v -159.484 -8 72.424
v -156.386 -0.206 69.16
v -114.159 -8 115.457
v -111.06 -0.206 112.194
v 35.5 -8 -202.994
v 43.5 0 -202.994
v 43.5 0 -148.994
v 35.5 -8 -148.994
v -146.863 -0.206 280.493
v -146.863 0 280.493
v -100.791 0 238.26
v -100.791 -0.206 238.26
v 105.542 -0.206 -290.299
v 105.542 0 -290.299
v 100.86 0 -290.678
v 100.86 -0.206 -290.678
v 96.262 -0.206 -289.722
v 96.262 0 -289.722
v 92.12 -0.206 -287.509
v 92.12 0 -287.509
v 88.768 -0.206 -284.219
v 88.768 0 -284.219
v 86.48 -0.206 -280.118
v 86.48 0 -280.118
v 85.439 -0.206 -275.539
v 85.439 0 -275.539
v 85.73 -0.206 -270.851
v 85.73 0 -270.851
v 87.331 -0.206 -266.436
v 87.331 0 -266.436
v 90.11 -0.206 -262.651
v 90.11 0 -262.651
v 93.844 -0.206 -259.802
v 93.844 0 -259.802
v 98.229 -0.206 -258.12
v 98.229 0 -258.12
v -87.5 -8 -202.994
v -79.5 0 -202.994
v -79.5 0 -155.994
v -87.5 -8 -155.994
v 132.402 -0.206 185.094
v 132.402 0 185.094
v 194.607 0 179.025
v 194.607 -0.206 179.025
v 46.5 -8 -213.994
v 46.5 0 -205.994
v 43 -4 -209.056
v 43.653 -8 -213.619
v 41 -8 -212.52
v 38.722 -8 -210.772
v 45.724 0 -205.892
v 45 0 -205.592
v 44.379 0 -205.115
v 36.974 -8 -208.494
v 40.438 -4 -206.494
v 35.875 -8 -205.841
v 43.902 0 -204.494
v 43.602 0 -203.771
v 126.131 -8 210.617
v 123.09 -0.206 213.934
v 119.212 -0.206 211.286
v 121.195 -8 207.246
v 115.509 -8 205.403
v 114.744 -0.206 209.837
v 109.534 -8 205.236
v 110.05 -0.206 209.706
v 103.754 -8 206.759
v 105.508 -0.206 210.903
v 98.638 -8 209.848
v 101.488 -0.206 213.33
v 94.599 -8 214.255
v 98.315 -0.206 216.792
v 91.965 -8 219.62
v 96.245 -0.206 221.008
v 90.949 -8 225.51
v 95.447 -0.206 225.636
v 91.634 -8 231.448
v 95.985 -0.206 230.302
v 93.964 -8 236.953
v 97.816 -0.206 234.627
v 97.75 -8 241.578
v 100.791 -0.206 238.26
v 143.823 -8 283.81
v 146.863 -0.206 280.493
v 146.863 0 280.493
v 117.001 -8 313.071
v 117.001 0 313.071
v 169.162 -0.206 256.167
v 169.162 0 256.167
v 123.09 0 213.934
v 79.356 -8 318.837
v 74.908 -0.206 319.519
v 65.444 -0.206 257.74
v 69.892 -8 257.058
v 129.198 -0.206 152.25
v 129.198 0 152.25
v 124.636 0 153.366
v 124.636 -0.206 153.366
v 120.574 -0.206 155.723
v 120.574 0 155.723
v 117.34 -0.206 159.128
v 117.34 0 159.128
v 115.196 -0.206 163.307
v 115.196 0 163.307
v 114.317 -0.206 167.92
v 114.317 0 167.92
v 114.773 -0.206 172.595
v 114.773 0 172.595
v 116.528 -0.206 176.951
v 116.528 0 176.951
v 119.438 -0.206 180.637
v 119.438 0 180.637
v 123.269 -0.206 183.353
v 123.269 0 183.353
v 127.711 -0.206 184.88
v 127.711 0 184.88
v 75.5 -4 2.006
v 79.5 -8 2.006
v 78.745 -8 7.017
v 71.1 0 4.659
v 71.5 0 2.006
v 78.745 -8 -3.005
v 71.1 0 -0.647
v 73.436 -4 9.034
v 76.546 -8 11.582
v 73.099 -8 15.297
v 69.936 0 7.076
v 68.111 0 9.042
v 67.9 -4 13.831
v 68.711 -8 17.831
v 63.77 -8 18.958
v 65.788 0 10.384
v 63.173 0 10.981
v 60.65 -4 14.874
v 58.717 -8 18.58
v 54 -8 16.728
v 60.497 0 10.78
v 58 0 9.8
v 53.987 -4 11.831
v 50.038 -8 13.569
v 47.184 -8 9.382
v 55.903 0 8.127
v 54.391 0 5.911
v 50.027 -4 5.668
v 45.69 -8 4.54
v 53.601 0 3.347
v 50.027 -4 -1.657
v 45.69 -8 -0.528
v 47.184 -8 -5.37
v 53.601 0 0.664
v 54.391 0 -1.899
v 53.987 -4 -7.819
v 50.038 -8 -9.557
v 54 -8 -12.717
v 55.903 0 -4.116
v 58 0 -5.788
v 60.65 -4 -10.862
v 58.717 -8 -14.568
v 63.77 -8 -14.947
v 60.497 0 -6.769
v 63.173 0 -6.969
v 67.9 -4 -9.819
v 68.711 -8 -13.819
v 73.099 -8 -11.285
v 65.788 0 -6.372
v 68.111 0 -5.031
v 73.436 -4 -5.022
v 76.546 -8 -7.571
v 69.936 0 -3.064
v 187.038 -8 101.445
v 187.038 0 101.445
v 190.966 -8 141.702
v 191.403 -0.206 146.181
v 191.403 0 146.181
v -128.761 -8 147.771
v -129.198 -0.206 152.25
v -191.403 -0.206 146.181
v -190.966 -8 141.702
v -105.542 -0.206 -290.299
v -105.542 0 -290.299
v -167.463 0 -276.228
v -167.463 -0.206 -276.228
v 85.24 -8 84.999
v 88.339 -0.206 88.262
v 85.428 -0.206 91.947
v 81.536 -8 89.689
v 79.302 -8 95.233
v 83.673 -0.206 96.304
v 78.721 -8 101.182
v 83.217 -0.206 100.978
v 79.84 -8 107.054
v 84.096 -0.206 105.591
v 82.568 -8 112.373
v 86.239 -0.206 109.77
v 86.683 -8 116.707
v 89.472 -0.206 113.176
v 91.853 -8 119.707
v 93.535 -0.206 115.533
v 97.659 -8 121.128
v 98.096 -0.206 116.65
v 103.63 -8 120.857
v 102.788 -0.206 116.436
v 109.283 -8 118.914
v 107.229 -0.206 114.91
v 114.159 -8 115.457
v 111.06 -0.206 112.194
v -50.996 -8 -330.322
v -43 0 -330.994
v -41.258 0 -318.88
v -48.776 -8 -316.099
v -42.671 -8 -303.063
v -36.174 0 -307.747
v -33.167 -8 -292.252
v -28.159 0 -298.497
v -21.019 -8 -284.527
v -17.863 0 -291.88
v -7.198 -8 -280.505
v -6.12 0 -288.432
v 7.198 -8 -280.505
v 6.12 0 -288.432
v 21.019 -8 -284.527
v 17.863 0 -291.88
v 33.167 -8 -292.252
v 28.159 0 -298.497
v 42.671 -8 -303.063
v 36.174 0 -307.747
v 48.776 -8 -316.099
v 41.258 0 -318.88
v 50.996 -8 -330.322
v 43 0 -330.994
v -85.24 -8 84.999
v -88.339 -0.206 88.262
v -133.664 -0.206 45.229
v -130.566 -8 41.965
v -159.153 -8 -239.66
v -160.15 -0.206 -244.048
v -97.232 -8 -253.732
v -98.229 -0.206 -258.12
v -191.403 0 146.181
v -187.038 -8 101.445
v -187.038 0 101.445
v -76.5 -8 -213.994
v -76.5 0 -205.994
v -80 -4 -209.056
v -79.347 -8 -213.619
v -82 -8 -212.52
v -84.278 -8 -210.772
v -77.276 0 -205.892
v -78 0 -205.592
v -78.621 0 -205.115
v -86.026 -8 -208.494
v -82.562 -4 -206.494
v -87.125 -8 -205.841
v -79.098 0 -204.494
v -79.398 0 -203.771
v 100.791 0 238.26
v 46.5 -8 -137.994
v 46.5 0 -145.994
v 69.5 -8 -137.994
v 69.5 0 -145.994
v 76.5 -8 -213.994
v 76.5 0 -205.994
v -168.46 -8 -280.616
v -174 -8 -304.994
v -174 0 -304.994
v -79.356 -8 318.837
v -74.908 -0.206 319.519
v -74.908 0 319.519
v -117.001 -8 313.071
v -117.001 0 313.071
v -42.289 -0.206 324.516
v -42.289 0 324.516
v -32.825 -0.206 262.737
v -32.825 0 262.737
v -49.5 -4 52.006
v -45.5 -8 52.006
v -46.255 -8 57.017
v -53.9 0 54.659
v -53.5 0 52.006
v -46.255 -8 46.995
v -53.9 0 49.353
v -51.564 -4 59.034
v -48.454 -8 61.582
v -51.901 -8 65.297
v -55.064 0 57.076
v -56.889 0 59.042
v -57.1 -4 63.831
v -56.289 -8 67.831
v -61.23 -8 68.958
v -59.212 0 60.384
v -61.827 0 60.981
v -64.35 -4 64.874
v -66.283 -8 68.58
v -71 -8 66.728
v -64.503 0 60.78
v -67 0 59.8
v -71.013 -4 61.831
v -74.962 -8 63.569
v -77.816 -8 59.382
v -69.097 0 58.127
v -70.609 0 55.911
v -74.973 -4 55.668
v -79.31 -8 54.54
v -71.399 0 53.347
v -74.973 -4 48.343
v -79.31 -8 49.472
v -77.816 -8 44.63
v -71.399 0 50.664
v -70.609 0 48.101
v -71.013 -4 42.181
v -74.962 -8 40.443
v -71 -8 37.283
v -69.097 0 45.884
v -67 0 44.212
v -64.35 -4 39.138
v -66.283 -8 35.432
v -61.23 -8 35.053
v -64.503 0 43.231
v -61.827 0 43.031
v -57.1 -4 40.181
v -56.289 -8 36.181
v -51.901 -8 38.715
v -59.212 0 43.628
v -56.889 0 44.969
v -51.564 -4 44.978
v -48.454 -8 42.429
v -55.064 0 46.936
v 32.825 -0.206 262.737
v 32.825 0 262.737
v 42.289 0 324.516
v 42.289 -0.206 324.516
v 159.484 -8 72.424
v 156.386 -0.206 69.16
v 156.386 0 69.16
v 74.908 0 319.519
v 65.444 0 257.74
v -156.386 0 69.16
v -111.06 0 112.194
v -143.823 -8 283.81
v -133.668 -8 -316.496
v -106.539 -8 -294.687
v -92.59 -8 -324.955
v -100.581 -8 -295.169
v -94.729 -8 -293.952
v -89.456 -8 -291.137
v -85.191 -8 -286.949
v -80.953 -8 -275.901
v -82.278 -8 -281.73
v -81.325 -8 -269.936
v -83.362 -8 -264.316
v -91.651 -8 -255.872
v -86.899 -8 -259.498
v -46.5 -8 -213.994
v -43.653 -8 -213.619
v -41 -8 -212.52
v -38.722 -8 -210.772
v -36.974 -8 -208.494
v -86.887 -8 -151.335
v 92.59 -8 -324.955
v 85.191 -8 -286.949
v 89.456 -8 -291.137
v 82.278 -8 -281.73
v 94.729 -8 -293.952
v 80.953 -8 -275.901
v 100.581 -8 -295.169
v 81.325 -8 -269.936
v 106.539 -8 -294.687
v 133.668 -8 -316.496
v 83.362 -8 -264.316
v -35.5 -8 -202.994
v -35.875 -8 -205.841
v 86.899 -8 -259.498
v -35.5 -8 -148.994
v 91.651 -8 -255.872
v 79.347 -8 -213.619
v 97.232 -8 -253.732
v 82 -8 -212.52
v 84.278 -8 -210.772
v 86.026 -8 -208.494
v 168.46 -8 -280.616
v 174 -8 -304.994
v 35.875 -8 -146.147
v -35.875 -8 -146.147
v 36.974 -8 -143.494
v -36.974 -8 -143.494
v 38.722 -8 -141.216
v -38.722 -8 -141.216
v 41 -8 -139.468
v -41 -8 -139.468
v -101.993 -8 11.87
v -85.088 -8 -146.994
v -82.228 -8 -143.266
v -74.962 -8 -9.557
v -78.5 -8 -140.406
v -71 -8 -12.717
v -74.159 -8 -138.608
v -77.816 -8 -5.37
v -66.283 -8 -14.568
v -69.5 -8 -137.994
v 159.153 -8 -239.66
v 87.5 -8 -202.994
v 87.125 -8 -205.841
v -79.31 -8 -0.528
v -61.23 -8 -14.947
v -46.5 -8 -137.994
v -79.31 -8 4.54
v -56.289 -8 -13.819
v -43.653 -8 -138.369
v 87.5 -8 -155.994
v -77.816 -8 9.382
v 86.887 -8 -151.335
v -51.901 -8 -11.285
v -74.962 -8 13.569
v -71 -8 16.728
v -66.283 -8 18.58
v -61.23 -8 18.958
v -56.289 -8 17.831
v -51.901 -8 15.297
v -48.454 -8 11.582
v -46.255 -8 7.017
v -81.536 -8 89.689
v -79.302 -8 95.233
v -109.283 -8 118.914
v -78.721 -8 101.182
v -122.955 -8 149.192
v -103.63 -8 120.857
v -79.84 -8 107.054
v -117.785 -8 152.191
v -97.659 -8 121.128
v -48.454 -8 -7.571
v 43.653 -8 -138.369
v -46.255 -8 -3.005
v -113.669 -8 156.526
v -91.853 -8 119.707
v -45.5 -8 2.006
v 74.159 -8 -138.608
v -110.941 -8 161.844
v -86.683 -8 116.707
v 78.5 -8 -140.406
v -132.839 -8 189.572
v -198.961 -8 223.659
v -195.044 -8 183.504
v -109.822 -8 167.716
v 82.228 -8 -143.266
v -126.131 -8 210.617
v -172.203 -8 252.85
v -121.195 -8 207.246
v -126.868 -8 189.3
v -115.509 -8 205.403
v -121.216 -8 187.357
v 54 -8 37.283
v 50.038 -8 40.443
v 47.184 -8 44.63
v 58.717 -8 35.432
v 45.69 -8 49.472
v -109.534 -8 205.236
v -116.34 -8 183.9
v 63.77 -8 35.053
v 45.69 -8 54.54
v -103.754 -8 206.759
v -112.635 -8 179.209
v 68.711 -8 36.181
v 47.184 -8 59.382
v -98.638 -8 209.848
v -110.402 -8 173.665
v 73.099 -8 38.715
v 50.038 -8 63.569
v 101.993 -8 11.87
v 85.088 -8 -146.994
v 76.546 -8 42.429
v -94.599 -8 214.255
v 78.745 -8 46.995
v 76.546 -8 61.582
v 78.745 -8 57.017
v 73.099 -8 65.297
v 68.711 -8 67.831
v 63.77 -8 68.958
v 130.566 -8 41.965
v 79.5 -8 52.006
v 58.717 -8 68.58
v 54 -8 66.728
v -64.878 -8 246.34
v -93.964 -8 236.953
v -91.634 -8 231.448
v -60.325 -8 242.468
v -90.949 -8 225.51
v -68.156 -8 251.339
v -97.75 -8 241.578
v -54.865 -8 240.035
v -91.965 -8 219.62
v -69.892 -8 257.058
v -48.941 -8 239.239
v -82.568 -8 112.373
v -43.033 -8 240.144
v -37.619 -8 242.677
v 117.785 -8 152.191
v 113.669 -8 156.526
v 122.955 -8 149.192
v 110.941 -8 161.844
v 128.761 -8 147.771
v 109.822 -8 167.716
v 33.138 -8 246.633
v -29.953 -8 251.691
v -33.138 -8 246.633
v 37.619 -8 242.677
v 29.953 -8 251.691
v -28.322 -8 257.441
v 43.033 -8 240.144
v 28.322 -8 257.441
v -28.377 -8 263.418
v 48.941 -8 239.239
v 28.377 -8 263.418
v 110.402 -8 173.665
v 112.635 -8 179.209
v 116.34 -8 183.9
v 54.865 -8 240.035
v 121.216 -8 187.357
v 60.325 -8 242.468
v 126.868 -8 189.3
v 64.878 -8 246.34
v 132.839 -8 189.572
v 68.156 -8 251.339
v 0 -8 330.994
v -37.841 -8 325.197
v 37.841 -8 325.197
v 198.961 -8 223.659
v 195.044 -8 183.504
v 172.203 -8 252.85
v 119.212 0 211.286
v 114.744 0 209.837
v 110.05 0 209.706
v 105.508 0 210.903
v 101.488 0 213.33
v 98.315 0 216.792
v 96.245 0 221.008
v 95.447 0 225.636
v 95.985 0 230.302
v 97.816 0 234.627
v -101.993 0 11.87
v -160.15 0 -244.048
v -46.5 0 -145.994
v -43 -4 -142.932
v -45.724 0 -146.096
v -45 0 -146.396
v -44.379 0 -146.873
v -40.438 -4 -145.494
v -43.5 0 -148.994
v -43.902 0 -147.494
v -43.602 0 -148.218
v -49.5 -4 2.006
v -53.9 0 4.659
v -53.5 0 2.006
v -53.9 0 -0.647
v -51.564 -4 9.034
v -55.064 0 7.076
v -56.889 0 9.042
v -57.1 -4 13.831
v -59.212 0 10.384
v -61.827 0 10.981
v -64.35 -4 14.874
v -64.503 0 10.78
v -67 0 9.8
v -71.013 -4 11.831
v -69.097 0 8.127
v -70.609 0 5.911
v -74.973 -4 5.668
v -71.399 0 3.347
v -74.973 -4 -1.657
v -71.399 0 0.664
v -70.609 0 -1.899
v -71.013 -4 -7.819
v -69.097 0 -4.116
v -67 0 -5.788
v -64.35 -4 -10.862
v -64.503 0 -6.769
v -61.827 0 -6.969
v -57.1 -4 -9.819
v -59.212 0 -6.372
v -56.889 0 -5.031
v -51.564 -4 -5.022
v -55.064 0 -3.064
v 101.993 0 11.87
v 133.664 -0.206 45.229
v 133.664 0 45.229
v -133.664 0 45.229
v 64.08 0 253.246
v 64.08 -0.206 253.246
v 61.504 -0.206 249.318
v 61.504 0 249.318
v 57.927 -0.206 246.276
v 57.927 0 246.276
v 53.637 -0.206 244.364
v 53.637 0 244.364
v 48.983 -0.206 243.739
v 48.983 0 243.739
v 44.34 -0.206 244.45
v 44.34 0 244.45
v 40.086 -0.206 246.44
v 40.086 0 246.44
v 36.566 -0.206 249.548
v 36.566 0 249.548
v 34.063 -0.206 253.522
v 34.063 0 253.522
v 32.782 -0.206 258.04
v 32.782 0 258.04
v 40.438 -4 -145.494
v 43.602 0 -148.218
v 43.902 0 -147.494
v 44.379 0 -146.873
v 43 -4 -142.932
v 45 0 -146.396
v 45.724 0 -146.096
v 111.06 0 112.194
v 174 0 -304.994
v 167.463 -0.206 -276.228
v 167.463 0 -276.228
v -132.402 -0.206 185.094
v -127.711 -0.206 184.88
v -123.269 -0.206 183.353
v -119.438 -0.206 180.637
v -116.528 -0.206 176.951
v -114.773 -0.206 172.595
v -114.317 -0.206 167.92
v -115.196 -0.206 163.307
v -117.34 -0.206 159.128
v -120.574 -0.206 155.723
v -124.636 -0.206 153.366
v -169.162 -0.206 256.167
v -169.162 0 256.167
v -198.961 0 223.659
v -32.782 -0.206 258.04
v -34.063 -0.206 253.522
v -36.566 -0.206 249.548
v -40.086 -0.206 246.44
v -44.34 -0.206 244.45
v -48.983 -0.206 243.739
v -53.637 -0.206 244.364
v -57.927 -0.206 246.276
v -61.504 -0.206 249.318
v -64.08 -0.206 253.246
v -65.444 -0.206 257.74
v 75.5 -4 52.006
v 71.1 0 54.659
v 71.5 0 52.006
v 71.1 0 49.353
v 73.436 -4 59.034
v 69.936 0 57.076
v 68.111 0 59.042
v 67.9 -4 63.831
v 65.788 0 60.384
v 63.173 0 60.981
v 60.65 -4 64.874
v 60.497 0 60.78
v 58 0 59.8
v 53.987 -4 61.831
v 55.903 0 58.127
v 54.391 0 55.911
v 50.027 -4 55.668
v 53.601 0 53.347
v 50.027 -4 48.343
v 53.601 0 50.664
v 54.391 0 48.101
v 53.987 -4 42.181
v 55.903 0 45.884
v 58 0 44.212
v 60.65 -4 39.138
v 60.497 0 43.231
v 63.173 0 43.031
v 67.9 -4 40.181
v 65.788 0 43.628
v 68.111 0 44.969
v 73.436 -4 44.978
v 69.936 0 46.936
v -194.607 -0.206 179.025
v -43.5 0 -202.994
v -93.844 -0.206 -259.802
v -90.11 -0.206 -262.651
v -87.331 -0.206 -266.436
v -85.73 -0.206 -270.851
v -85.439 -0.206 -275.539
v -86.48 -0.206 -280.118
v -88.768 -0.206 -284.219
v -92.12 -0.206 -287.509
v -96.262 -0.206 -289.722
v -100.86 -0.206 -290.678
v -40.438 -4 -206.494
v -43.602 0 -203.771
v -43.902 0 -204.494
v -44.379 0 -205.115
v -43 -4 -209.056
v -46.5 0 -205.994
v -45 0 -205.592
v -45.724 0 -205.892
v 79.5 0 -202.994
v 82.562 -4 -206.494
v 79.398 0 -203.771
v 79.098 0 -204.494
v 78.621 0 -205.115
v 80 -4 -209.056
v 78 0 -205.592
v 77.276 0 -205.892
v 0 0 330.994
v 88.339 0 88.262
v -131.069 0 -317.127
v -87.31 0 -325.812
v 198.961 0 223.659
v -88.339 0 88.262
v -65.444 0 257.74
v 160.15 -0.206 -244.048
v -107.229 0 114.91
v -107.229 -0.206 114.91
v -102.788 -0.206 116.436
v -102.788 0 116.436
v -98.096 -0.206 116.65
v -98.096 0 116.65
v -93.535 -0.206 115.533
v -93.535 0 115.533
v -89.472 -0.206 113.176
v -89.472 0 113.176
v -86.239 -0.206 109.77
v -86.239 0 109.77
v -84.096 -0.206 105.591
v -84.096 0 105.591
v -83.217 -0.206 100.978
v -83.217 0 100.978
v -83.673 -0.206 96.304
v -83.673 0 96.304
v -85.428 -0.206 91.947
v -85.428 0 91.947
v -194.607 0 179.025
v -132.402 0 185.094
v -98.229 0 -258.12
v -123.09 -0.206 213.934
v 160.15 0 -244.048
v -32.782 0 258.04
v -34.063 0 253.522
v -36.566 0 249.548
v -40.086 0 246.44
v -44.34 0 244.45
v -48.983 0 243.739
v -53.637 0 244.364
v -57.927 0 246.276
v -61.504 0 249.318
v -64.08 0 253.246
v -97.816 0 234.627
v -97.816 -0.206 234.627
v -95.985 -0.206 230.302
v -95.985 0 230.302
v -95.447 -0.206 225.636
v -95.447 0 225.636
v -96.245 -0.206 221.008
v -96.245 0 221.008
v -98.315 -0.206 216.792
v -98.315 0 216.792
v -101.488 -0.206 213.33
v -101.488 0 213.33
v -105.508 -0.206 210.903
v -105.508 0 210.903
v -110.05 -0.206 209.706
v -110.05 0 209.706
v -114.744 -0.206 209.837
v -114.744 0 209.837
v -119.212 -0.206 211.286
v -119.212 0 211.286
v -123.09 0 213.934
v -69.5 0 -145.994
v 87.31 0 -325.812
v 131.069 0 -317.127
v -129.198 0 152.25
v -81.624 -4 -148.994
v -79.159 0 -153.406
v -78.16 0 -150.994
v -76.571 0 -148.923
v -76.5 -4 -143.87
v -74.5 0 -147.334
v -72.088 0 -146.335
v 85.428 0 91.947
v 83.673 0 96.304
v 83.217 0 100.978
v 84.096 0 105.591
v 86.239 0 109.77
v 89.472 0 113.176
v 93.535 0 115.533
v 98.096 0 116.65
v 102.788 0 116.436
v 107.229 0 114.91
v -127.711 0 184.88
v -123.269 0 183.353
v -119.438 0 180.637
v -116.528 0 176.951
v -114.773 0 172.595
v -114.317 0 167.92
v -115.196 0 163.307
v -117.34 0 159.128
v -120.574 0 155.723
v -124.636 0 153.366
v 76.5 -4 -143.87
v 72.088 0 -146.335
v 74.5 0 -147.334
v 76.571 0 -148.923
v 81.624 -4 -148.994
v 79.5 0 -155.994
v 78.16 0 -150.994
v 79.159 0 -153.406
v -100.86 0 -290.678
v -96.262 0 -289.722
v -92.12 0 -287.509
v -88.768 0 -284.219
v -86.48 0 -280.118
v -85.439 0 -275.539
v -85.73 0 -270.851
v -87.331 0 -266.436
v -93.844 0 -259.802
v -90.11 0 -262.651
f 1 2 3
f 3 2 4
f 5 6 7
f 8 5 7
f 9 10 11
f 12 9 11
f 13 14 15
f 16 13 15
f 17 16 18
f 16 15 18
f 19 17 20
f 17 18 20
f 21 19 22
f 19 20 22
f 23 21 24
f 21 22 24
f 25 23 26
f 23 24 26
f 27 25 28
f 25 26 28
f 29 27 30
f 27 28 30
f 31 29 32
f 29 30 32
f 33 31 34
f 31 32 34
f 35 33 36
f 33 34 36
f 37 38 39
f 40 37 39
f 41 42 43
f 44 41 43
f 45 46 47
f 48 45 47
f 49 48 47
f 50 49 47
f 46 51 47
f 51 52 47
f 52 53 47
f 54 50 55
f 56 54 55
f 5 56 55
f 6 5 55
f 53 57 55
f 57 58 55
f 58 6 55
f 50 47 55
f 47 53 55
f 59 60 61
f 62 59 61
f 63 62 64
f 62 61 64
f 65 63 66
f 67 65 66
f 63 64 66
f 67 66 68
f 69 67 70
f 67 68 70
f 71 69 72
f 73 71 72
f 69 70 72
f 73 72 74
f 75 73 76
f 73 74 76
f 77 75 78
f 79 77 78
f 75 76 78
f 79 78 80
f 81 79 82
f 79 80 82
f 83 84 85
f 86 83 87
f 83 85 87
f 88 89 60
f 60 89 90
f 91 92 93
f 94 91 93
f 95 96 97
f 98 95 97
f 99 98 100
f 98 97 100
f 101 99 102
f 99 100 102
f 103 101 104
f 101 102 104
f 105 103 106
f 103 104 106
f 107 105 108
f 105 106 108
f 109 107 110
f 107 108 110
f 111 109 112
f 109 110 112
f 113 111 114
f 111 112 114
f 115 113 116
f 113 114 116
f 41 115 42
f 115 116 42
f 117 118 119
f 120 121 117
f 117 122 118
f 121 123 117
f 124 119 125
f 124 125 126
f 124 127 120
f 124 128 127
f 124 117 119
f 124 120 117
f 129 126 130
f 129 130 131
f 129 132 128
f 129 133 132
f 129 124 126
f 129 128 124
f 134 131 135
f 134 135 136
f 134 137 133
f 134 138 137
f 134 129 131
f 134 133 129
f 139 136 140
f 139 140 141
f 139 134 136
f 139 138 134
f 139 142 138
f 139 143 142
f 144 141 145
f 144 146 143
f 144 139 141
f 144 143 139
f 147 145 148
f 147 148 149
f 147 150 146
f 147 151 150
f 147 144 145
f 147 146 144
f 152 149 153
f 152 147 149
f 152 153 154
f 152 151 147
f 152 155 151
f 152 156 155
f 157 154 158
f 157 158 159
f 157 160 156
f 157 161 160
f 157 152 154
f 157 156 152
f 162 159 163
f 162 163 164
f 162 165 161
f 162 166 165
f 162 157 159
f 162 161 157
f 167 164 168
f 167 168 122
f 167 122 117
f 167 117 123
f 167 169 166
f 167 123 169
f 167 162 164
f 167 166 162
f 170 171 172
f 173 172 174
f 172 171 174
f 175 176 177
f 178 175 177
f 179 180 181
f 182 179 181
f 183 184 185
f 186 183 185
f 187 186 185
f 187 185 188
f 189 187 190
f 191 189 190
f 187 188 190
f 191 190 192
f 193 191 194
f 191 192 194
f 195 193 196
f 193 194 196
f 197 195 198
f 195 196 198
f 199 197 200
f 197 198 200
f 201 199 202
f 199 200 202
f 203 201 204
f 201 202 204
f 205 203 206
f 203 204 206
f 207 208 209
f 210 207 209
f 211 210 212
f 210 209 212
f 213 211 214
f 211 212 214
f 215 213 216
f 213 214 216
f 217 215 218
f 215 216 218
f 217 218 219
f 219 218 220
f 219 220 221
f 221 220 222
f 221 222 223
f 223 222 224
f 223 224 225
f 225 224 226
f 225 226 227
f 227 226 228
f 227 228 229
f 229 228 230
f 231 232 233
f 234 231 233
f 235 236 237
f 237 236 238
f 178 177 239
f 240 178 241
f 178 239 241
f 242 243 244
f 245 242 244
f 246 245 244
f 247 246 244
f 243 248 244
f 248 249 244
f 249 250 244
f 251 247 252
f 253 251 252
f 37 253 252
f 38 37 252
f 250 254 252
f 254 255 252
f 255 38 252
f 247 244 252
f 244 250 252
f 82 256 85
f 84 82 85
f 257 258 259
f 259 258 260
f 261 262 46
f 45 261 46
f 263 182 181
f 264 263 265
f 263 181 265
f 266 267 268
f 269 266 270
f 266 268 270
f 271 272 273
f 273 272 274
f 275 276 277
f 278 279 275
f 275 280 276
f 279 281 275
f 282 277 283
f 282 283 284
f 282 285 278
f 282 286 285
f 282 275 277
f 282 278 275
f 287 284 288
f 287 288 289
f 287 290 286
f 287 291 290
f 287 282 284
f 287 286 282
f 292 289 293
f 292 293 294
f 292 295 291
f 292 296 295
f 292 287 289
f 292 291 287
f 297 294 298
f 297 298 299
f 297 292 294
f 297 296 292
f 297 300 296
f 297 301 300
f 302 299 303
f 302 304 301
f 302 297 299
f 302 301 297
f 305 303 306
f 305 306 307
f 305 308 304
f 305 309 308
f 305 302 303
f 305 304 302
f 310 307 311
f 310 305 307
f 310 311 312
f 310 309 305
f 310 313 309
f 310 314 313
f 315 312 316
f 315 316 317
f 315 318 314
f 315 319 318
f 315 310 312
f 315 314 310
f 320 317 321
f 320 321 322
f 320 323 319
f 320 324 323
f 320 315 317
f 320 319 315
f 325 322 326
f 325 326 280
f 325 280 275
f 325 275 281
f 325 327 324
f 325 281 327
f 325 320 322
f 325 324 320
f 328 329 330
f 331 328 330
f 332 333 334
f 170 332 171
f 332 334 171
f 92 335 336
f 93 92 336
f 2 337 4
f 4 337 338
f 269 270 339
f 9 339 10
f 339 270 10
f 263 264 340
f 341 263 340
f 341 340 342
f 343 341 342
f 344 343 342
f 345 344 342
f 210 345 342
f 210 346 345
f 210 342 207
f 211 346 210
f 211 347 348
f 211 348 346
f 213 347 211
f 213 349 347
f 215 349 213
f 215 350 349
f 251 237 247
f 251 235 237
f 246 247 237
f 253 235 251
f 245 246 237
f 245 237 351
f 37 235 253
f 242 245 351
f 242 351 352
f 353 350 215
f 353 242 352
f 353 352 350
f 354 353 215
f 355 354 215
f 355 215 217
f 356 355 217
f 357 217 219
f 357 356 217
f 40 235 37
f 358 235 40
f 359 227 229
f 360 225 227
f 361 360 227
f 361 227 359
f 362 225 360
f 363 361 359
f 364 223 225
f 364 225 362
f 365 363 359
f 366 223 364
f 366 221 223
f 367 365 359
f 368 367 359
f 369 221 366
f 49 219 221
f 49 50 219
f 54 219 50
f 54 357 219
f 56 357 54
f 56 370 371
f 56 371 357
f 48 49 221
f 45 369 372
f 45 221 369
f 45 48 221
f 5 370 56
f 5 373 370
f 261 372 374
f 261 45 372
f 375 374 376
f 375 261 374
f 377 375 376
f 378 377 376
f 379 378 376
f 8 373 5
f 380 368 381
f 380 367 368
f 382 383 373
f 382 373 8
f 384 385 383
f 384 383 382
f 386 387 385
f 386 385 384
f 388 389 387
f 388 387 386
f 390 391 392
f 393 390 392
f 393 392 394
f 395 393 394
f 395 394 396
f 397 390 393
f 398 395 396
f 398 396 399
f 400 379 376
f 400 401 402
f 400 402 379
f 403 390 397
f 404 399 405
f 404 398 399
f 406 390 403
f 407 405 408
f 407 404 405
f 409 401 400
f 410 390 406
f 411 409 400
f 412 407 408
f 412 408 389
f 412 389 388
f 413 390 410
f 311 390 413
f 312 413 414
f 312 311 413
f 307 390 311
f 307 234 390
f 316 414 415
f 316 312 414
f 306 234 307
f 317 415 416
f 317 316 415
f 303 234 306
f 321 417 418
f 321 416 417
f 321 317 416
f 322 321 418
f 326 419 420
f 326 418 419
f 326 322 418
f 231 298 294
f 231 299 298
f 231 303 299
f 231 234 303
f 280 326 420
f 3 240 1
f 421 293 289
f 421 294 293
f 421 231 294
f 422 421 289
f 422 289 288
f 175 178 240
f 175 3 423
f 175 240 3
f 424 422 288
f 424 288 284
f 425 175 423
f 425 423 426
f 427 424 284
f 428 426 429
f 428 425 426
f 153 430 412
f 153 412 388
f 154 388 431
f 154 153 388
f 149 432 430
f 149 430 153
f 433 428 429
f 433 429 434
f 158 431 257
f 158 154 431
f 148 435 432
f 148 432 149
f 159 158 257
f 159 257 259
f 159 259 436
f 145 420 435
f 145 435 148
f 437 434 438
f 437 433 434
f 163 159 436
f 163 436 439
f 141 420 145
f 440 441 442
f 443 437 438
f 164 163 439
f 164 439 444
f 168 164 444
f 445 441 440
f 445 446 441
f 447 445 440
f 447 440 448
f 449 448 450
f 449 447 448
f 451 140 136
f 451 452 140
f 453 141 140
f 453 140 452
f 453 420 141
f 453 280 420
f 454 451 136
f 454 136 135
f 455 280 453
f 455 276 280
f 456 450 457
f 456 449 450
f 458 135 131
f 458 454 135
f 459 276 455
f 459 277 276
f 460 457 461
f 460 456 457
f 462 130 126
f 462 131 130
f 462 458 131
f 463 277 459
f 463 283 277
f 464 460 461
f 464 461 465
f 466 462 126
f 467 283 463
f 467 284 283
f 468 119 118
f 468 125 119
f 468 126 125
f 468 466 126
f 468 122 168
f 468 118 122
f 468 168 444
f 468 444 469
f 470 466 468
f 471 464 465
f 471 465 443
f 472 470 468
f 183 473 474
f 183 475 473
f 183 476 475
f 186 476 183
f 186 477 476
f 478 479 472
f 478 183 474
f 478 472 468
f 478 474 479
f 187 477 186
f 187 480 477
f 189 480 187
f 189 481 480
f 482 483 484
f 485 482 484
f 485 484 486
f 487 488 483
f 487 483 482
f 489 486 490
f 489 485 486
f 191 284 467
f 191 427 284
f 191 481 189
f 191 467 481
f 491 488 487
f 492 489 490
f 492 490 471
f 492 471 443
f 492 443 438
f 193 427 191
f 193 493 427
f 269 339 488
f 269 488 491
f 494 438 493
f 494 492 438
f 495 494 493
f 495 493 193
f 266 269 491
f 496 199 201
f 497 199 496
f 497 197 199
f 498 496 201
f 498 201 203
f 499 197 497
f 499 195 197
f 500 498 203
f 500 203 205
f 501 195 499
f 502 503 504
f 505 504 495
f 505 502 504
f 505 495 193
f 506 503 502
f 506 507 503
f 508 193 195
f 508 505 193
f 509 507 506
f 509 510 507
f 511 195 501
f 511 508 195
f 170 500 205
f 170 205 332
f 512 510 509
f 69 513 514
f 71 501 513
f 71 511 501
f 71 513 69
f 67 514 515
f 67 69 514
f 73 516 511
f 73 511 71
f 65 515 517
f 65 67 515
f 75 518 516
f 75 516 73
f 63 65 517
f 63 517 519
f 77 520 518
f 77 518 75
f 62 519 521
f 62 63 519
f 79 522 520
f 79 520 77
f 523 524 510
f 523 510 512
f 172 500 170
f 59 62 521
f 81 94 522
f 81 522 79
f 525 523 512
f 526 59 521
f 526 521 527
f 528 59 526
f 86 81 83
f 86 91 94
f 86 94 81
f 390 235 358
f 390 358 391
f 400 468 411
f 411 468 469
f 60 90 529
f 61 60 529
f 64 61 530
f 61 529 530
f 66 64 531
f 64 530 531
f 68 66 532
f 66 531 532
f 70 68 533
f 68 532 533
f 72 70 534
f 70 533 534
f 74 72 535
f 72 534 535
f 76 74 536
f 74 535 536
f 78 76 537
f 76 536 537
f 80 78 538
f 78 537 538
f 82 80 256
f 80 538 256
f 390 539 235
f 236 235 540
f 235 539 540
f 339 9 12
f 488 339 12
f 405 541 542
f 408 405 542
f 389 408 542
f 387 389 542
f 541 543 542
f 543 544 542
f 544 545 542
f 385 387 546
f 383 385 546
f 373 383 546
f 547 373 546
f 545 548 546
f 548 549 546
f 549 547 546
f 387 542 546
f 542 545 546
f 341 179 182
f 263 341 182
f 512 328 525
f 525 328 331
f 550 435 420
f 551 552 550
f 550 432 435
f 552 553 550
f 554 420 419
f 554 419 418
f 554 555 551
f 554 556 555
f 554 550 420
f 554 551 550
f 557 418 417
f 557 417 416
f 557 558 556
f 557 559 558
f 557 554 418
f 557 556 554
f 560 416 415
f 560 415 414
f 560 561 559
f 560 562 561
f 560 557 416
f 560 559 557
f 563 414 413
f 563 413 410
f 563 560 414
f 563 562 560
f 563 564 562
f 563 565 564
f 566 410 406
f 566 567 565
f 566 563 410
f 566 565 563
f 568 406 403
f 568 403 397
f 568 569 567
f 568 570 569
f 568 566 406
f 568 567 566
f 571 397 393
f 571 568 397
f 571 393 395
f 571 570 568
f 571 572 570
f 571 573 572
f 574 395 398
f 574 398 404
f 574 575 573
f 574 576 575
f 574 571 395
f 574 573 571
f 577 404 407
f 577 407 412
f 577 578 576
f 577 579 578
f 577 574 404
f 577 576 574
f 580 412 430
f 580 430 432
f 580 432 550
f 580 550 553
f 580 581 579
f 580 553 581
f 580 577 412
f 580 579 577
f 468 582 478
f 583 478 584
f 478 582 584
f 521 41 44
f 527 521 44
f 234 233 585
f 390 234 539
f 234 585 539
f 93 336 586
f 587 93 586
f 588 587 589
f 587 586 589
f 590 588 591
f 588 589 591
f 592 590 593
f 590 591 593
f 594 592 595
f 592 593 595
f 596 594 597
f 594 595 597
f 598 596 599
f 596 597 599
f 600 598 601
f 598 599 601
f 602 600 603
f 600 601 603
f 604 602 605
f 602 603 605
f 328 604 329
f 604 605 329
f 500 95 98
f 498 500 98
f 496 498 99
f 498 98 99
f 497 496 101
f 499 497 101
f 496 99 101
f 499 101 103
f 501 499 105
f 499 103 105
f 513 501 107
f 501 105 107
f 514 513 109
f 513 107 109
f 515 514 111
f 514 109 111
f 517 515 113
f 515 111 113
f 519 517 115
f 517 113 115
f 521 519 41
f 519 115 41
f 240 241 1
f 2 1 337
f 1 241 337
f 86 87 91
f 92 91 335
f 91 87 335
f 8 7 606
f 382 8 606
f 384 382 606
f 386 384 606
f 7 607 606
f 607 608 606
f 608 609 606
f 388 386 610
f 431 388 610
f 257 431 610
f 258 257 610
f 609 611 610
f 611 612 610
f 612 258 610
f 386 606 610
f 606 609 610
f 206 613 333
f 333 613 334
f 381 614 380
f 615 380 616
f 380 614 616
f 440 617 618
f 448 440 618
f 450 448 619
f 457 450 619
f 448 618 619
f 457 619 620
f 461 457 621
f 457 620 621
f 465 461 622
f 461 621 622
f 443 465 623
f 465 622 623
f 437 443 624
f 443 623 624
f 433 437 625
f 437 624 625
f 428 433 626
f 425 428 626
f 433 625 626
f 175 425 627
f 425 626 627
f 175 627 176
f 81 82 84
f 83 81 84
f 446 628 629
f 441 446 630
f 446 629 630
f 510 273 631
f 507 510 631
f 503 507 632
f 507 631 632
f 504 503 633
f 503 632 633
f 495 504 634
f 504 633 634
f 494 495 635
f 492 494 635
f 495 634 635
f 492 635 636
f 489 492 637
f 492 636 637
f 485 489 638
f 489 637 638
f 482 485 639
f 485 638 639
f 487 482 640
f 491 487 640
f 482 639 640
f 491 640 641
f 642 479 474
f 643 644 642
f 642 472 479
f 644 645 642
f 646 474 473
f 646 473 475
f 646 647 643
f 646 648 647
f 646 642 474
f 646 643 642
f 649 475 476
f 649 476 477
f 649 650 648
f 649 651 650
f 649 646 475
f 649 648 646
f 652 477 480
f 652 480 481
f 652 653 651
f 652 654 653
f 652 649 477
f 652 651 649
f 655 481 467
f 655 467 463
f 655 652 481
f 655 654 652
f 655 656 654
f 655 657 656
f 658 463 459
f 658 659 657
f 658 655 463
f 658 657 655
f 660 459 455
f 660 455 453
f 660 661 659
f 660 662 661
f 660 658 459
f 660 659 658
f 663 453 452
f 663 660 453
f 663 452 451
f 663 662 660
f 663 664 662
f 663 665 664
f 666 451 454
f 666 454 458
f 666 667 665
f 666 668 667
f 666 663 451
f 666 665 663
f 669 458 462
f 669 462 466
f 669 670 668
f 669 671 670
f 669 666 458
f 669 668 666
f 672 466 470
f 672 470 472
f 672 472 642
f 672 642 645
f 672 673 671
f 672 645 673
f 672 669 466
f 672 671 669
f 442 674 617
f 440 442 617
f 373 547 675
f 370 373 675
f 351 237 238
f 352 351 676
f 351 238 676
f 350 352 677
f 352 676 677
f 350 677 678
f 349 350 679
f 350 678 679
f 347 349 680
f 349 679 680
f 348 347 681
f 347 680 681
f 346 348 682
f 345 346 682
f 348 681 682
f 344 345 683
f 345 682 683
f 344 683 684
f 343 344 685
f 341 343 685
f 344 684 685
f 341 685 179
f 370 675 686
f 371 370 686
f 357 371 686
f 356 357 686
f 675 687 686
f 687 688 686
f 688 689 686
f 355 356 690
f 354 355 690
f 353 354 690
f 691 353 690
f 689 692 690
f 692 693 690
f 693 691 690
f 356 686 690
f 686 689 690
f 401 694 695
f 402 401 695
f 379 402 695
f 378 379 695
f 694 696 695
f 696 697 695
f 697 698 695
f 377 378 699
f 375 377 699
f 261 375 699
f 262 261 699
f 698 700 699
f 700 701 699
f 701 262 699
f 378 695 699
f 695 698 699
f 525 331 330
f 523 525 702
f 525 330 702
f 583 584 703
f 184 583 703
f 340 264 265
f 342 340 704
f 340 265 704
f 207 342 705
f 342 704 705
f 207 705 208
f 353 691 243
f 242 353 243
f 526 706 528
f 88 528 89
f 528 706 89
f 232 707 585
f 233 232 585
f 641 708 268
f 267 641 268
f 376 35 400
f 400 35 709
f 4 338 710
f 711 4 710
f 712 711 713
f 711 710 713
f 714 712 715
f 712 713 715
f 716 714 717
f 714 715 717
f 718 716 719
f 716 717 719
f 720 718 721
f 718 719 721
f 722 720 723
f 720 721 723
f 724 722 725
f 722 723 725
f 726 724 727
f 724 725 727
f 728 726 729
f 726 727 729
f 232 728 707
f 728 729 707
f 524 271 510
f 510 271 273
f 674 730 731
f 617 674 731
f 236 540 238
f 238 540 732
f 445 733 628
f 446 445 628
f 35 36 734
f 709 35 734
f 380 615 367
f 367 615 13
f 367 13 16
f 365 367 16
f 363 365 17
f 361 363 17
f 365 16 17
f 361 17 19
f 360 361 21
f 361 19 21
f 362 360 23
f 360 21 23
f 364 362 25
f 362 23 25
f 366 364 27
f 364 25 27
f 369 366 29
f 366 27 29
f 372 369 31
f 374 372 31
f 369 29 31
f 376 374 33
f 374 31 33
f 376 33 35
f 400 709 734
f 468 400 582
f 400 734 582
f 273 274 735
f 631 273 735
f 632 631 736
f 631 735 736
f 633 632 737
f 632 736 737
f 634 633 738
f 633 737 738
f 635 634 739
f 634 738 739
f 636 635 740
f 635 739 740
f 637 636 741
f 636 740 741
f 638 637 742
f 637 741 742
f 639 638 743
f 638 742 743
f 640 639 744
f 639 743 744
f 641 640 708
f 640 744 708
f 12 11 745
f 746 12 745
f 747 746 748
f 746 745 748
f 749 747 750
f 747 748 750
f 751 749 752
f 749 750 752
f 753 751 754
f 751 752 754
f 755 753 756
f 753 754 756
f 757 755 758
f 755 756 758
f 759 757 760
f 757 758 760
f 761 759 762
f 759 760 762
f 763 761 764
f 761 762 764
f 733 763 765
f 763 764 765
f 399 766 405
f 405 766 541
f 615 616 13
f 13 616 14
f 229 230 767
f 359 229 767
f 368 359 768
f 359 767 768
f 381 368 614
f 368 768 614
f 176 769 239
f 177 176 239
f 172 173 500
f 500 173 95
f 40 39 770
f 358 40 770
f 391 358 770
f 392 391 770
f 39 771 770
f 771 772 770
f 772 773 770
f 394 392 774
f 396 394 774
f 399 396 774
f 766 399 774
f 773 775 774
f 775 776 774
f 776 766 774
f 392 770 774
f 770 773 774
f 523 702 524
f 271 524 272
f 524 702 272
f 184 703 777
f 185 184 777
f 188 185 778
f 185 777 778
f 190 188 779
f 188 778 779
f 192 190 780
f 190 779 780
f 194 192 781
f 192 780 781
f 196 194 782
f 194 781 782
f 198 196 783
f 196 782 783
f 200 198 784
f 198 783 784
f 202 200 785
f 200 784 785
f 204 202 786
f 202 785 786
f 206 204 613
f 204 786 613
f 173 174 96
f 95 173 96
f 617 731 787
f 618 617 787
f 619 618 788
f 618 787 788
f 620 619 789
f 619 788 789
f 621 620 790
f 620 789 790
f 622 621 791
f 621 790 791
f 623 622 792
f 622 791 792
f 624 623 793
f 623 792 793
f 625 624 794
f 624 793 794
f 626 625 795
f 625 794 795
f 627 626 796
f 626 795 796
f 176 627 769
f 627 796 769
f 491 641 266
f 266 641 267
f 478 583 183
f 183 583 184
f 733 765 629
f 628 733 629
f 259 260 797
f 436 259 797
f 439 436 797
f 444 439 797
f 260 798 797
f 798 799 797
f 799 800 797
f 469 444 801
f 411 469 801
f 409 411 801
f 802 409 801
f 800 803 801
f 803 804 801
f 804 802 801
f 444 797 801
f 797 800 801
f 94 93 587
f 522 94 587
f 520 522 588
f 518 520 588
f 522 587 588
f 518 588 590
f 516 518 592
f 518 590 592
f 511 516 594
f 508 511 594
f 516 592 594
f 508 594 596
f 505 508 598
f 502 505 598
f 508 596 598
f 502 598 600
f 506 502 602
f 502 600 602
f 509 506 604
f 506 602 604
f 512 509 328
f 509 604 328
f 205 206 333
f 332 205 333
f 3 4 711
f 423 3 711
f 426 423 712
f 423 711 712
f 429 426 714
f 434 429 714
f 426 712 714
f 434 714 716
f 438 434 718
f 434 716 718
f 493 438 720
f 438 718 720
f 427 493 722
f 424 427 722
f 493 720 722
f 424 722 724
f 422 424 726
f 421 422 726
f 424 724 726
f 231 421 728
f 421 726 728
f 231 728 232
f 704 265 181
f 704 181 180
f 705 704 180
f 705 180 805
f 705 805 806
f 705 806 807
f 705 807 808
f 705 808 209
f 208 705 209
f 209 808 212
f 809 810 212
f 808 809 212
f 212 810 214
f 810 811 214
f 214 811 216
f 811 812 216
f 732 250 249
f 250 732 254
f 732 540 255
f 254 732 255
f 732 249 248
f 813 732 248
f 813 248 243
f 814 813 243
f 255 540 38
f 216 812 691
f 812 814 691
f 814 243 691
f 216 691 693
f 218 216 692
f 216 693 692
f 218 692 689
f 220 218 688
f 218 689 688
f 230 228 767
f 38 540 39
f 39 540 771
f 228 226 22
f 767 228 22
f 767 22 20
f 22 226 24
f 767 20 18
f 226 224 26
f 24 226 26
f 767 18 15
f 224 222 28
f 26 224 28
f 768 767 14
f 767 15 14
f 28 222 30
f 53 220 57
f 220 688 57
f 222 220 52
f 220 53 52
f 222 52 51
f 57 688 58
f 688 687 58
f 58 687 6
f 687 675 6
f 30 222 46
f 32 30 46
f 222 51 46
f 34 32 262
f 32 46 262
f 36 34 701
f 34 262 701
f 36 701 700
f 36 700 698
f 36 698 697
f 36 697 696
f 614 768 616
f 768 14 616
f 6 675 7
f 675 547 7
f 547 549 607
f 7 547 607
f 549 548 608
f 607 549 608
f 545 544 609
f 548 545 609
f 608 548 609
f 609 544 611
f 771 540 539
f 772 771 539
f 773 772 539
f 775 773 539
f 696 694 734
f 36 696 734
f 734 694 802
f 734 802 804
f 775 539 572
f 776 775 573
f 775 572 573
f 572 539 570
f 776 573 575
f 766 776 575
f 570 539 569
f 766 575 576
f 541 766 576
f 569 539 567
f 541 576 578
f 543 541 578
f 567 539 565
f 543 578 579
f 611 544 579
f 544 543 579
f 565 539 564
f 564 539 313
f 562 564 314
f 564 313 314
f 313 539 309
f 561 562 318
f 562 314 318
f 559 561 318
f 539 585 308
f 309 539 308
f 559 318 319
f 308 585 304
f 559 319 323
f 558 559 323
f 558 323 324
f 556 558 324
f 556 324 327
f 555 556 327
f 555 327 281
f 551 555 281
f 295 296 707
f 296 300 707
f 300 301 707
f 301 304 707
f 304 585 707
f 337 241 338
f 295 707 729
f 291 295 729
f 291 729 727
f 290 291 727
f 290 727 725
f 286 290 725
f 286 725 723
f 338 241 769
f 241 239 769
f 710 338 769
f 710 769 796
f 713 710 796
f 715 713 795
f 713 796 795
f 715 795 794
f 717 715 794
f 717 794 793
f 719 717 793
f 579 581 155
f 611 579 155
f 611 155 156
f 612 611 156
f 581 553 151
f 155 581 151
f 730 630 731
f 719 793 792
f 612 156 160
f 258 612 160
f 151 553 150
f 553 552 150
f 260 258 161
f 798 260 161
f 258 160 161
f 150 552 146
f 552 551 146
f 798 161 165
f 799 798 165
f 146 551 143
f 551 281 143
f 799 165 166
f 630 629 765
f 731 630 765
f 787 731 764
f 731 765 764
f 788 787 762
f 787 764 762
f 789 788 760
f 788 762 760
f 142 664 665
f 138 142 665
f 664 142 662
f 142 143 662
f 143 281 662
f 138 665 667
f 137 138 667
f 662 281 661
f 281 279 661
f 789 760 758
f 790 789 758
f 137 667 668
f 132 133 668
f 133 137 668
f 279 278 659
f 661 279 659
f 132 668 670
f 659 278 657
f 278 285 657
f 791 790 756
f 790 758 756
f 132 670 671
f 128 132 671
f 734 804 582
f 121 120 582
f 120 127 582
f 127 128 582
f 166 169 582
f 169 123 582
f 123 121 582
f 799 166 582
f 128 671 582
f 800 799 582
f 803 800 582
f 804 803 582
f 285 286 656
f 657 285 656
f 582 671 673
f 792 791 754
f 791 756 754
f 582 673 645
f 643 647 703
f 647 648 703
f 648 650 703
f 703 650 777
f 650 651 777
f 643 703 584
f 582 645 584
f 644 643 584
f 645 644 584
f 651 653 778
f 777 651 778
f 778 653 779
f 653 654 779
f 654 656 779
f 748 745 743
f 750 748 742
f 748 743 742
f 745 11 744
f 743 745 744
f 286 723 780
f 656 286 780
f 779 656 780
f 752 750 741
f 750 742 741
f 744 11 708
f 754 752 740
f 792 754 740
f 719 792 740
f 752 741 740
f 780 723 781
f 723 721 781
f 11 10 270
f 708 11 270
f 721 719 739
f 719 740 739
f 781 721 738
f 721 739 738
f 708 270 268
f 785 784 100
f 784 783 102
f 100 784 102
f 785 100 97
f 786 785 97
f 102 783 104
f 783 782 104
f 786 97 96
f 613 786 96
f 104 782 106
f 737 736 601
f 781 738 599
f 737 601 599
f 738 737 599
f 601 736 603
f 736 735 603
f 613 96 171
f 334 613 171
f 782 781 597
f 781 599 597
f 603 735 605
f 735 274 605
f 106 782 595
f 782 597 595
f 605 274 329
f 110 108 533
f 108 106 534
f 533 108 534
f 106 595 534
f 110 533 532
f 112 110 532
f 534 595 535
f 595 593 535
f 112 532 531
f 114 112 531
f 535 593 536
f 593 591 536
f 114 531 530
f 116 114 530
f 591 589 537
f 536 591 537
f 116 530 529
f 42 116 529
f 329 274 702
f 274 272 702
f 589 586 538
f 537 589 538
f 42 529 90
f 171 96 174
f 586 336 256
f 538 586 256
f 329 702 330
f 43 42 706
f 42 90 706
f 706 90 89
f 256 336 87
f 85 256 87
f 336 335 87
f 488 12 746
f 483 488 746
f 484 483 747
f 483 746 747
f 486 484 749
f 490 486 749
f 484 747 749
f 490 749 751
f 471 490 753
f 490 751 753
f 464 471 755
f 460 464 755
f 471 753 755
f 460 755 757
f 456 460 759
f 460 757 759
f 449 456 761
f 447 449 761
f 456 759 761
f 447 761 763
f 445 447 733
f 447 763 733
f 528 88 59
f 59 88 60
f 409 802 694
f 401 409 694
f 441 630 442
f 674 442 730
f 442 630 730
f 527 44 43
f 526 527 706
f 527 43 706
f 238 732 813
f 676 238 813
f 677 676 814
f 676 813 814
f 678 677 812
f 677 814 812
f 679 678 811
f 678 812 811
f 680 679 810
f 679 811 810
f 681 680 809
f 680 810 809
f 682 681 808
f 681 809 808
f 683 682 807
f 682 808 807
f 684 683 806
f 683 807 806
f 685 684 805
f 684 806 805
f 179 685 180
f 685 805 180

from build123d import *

# Parameters (mm, degrees)
F0_R     = 9
F1_DEPTH = 8
F2_R     = 3
F3_SIZE  = 7.99999
F4_SIZE2 = 7.7942286341
F4_SIZE  = 4.5


# Not quite as in the source:
# - a fillet or chamfer is up to 0.001 mm smaller than in the source, because OpenCascade refuses the exact size
# - ends of sketch curves that miss each other by under 0.0002 mm in the source are joined


with BuildPart() as f1:
    # F0 (on Front) → F1 (new body)
    with BuildSketch(Plane.XZ):
        with BuildLine():
            ThreePointArc((-43, -330.994167), (0, -287.994167), (43, -330.994167))
            ThreePointArc((43, -330.994167), (109.276026714, -321.904147751), (174.0000001055, -304.9941673237))
            Line((174.0000001055, -304.9941673237), (167.462801, -276.227606))
            Line((167.462801, -276.227606), (105.54156, -290.299203))
            ThreePointArc((105.54156, -290.299203), (85.7953886494, -277.8658315797), (98.2287608958, -258.1196605414))
            Line((98.2287608958, -258.1196605414), (160.150002, -244.048063))
            Line((160.150002, -244.048063), (101.992538, 11.87045))
            Line((101.992538, 11.87045), (133.663965, 45.228522))
            Line((133.663965, 45.228522), (88.338787, 88.261977))
            ThreePointArc((88.338787, 88.261977), (87.7337722092, 111.5886563014), (111.0604515643, 112.1936705411))
            Line((111.0604515643, 112.1936705411), (156.385629, 69.160216))
            Line((156.385629, 69.160216), (187.038105, 101.445071))
            Line((187.038105, 101.445071), (191.402576, 146.180902))
            Line((191.402576, 146.180902), (129.197911, 152.24965))
            ThreePointArc((129.197911, 152.24965), (114.3780295485, 170.2738304953), (132.4022099517, 185.0937125046))
            Line((132.4022099517, 185.0937125046), (194.606875, 179.024965))
            Line((194.606875, 179.024965), (198.96141, 223.658948))
            Line((198.96141, 223.658948), (169.162302, 256.167065))
            Line((169.162302, 256.167065), (123.090168, 213.934276))
            ThreePointArc((123.090168, 213.934276), (99.7776684169, 214.9478629238), (100.7912561729, 238.2603628114))
            Line((100.7912561729, 238.2603628114), (146.863389, 280.493152))
            Line((146.863389, 280.493152), (117.000674, 313.07066))
            Line((117.000674, 313.07066), (74.908309, 319.518852))
            Line((74.908309, 319.518852), (65.444247, 257.739555))
            ThreePointArc((65.444247, 257.739555), (46.6359995191, 243.928333625), (32.8247775616, 262.7365800672))
            Line((32.8247775616, 262.7365800672), (42.288841, 324.515877))
            Line((42.288841, 324.515877), (0, 330.994168))
            Line((0, 330.994168), (-42.288841, 324.515877))
            Line((-42.288841, 324.515877), (-32.824778, 262.73658))
            ThreePointArc((-32.824778, 262.73658), (-46.6360005191, 243.928333625), (-65.4442472887, 257.7395549558))
            Line((-65.4442472887, 257.7395549558), (-74.908309, 319.518852))
            Line((-74.908309, 319.518852), (-117.000674, 313.07066))
            Line((-117.000674, 313.07066), (-146.86339, 280.493152))
            Line((-146.86339, 280.493152), (-100.791256, 238.260363))
            ThreePointArc((-100.791256, 238.260363), (-99.7776686659, 214.9478626521), (-123.0901688686, 213.9342761433))
            Line((-123.0901688686, 213.9342761433), (-169.162302, 256.167065))
            Line((-169.162302, 256.167065), (-198.96141, 223.658948))
            Line((-198.96141, 223.658948), (-194.606875, 179.024965))
            Line((-194.606875, 179.024965), (-132.40221, 185.093713))
            ThreePointArc((-132.40221, 185.093713), (-114.3780295485, 170.2738304953), (-129.1979109611, 152.2496496015))
            Line((-129.1979109611, 152.2496496015), (-191.402576, 146.180902))
            Line((-191.402576, 146.180902), (-187.038105, 101.445071))
            Line((-187.038105, 101.445071), (-156.385629, 69.160216))
            Line((-156.385629, 69.160216), (-111.060452, 112.193671))
            ThreePointArc((-111.060452, 112.193671), (-87.7337732092, 111.5886563014), (-88.3387874357, 88.2619774589))
            Line((-88.3387874357, 88.2619774589), (-133.663965, 45.228522))
            Line((-133.663965, 45.228522), (-101.992538, 11.87045))
            Line((-101.992538, 11.87045), (-160.150002, -244.048063))
            Line((-160.150002, -244.048063), (-98.228761, -258.119661))
            ThreePointArc((-98.228761, -258.119661), (-85.7953886494, -277.8658315797), (-105.5415600551, -290.2992032425))
            Line((-105.5415600551, -290.2992032425), (-167.462801, -276.227606))
            Line((-167.462801, -276.227606), (-174, -304.994167))
            ThreePointArc((-174, -304.994167), (-109.276026714, -321.904147751), (-43, -330.994167))
        make_face()
        with BuildLine():
            Line((-69.5, -145.994167), (-43.5, -145.994167))
            Line((-43.5, -145.994167), (-43.5, -205.994167))
            Line((-43.5, -205.994167), (-79.5, -205.994167))
            Line((-79.5, -205.994167), (-79.5, -155.994167))
            ThreePointArc((-79.5, -155.994167), (-76.5710678119, -148.9230991881), (-69.5, -145.994167))
        make_face(mode=Mode.SUBTRACT)
        with BuildLine():
            Line((43.5, -205.994167), (43.5, -145.994167))
            Line((43.5, -145.994167), (69.5, -145.994167))
            ThreePointArc((69.5, -145.994167), (76.5710678119, -148.9230991881), (79.5, -155.994167))
            Line((79.5, -155.994167), (79.5, -205.994167))
            Line((79.5, -205.994167), (43.5, -205.994167))
        make_face(mode=Mode.SUBTRACT)
        with Locations((-62.5, 2.005833)):
            Circle(F0_R, mode=Mode.SUBTRACT)
        with Locations((-62.5, 52.005833)):
            Circle(F0_R, mode=Mode.SUBTRACT)
        with Locations((62.5, 2.005833)):
            Circle(F0_R, mode=Mode.SUBTRACT)
        with Locations((62.5, 52.005833)):
            Circle(F0_R, mode=Mode.SUBTRACT)
    extrude(amount=F1_DEPTH)

    # F2
    f2_edges = [f1.edges().sort_by_distance(p)[0] for p in [
        (-43.5, -4, -205.994167),
        (79.5, -4, -205.994167),
        (43.5, -4, -205.994167),
        (-79.5, -4, -205.994167),
        (-43.5, -4, -145.994167),
        (43.5, -4, -145.994167),
    ]]
    fillet(f2_edges, radius=F2_R)

    # F3 (size 8 in the source; OpenCascade refuses exactly that, so slightly less here)
    f3_edges = [f1.edges().sort_by_distance(p)[0] for p in [
        (-71.5, -8, 52.005833),
        (53.5, -8, 52.005833),
        (-71.5, -8, 2.005833),
        (53.5, -8, 2.005833),
        (-58, -8, -145.994167),
        (58, -8, -145.994167),
        (0, -8, -287.994167),
    ]]
    chamfer(f3_edges, length=F3_SIZE)

    # F4
    f4_edges = [f1.edges().sort_by_distance(p)[0] for p in [
        (-133.72304, -8, 90.676943),
        (-163.504543, -8, 182.059339),
        (-123.827323, -8, 259.376757),
        (-37.556809, -8, 293.626229),
        (70.176278, -8, 288.629204),
        (123.827323, -8, 259.376757),
        (163.504542, -8, 182.059339),
        (133.72304, -8, 90.676943),
        (129.189381, -8, -251.083862),
        (-129.189381, -8, -251.083862),
    ]]
    f4_side = f1.faces().sort_by_distance((0, -8, 8.818439))[0]
    chamfer(f4_edges, length=F4_SIZE, length2=F4_SIZE2, reference=f4_side)


solid = f1.part
